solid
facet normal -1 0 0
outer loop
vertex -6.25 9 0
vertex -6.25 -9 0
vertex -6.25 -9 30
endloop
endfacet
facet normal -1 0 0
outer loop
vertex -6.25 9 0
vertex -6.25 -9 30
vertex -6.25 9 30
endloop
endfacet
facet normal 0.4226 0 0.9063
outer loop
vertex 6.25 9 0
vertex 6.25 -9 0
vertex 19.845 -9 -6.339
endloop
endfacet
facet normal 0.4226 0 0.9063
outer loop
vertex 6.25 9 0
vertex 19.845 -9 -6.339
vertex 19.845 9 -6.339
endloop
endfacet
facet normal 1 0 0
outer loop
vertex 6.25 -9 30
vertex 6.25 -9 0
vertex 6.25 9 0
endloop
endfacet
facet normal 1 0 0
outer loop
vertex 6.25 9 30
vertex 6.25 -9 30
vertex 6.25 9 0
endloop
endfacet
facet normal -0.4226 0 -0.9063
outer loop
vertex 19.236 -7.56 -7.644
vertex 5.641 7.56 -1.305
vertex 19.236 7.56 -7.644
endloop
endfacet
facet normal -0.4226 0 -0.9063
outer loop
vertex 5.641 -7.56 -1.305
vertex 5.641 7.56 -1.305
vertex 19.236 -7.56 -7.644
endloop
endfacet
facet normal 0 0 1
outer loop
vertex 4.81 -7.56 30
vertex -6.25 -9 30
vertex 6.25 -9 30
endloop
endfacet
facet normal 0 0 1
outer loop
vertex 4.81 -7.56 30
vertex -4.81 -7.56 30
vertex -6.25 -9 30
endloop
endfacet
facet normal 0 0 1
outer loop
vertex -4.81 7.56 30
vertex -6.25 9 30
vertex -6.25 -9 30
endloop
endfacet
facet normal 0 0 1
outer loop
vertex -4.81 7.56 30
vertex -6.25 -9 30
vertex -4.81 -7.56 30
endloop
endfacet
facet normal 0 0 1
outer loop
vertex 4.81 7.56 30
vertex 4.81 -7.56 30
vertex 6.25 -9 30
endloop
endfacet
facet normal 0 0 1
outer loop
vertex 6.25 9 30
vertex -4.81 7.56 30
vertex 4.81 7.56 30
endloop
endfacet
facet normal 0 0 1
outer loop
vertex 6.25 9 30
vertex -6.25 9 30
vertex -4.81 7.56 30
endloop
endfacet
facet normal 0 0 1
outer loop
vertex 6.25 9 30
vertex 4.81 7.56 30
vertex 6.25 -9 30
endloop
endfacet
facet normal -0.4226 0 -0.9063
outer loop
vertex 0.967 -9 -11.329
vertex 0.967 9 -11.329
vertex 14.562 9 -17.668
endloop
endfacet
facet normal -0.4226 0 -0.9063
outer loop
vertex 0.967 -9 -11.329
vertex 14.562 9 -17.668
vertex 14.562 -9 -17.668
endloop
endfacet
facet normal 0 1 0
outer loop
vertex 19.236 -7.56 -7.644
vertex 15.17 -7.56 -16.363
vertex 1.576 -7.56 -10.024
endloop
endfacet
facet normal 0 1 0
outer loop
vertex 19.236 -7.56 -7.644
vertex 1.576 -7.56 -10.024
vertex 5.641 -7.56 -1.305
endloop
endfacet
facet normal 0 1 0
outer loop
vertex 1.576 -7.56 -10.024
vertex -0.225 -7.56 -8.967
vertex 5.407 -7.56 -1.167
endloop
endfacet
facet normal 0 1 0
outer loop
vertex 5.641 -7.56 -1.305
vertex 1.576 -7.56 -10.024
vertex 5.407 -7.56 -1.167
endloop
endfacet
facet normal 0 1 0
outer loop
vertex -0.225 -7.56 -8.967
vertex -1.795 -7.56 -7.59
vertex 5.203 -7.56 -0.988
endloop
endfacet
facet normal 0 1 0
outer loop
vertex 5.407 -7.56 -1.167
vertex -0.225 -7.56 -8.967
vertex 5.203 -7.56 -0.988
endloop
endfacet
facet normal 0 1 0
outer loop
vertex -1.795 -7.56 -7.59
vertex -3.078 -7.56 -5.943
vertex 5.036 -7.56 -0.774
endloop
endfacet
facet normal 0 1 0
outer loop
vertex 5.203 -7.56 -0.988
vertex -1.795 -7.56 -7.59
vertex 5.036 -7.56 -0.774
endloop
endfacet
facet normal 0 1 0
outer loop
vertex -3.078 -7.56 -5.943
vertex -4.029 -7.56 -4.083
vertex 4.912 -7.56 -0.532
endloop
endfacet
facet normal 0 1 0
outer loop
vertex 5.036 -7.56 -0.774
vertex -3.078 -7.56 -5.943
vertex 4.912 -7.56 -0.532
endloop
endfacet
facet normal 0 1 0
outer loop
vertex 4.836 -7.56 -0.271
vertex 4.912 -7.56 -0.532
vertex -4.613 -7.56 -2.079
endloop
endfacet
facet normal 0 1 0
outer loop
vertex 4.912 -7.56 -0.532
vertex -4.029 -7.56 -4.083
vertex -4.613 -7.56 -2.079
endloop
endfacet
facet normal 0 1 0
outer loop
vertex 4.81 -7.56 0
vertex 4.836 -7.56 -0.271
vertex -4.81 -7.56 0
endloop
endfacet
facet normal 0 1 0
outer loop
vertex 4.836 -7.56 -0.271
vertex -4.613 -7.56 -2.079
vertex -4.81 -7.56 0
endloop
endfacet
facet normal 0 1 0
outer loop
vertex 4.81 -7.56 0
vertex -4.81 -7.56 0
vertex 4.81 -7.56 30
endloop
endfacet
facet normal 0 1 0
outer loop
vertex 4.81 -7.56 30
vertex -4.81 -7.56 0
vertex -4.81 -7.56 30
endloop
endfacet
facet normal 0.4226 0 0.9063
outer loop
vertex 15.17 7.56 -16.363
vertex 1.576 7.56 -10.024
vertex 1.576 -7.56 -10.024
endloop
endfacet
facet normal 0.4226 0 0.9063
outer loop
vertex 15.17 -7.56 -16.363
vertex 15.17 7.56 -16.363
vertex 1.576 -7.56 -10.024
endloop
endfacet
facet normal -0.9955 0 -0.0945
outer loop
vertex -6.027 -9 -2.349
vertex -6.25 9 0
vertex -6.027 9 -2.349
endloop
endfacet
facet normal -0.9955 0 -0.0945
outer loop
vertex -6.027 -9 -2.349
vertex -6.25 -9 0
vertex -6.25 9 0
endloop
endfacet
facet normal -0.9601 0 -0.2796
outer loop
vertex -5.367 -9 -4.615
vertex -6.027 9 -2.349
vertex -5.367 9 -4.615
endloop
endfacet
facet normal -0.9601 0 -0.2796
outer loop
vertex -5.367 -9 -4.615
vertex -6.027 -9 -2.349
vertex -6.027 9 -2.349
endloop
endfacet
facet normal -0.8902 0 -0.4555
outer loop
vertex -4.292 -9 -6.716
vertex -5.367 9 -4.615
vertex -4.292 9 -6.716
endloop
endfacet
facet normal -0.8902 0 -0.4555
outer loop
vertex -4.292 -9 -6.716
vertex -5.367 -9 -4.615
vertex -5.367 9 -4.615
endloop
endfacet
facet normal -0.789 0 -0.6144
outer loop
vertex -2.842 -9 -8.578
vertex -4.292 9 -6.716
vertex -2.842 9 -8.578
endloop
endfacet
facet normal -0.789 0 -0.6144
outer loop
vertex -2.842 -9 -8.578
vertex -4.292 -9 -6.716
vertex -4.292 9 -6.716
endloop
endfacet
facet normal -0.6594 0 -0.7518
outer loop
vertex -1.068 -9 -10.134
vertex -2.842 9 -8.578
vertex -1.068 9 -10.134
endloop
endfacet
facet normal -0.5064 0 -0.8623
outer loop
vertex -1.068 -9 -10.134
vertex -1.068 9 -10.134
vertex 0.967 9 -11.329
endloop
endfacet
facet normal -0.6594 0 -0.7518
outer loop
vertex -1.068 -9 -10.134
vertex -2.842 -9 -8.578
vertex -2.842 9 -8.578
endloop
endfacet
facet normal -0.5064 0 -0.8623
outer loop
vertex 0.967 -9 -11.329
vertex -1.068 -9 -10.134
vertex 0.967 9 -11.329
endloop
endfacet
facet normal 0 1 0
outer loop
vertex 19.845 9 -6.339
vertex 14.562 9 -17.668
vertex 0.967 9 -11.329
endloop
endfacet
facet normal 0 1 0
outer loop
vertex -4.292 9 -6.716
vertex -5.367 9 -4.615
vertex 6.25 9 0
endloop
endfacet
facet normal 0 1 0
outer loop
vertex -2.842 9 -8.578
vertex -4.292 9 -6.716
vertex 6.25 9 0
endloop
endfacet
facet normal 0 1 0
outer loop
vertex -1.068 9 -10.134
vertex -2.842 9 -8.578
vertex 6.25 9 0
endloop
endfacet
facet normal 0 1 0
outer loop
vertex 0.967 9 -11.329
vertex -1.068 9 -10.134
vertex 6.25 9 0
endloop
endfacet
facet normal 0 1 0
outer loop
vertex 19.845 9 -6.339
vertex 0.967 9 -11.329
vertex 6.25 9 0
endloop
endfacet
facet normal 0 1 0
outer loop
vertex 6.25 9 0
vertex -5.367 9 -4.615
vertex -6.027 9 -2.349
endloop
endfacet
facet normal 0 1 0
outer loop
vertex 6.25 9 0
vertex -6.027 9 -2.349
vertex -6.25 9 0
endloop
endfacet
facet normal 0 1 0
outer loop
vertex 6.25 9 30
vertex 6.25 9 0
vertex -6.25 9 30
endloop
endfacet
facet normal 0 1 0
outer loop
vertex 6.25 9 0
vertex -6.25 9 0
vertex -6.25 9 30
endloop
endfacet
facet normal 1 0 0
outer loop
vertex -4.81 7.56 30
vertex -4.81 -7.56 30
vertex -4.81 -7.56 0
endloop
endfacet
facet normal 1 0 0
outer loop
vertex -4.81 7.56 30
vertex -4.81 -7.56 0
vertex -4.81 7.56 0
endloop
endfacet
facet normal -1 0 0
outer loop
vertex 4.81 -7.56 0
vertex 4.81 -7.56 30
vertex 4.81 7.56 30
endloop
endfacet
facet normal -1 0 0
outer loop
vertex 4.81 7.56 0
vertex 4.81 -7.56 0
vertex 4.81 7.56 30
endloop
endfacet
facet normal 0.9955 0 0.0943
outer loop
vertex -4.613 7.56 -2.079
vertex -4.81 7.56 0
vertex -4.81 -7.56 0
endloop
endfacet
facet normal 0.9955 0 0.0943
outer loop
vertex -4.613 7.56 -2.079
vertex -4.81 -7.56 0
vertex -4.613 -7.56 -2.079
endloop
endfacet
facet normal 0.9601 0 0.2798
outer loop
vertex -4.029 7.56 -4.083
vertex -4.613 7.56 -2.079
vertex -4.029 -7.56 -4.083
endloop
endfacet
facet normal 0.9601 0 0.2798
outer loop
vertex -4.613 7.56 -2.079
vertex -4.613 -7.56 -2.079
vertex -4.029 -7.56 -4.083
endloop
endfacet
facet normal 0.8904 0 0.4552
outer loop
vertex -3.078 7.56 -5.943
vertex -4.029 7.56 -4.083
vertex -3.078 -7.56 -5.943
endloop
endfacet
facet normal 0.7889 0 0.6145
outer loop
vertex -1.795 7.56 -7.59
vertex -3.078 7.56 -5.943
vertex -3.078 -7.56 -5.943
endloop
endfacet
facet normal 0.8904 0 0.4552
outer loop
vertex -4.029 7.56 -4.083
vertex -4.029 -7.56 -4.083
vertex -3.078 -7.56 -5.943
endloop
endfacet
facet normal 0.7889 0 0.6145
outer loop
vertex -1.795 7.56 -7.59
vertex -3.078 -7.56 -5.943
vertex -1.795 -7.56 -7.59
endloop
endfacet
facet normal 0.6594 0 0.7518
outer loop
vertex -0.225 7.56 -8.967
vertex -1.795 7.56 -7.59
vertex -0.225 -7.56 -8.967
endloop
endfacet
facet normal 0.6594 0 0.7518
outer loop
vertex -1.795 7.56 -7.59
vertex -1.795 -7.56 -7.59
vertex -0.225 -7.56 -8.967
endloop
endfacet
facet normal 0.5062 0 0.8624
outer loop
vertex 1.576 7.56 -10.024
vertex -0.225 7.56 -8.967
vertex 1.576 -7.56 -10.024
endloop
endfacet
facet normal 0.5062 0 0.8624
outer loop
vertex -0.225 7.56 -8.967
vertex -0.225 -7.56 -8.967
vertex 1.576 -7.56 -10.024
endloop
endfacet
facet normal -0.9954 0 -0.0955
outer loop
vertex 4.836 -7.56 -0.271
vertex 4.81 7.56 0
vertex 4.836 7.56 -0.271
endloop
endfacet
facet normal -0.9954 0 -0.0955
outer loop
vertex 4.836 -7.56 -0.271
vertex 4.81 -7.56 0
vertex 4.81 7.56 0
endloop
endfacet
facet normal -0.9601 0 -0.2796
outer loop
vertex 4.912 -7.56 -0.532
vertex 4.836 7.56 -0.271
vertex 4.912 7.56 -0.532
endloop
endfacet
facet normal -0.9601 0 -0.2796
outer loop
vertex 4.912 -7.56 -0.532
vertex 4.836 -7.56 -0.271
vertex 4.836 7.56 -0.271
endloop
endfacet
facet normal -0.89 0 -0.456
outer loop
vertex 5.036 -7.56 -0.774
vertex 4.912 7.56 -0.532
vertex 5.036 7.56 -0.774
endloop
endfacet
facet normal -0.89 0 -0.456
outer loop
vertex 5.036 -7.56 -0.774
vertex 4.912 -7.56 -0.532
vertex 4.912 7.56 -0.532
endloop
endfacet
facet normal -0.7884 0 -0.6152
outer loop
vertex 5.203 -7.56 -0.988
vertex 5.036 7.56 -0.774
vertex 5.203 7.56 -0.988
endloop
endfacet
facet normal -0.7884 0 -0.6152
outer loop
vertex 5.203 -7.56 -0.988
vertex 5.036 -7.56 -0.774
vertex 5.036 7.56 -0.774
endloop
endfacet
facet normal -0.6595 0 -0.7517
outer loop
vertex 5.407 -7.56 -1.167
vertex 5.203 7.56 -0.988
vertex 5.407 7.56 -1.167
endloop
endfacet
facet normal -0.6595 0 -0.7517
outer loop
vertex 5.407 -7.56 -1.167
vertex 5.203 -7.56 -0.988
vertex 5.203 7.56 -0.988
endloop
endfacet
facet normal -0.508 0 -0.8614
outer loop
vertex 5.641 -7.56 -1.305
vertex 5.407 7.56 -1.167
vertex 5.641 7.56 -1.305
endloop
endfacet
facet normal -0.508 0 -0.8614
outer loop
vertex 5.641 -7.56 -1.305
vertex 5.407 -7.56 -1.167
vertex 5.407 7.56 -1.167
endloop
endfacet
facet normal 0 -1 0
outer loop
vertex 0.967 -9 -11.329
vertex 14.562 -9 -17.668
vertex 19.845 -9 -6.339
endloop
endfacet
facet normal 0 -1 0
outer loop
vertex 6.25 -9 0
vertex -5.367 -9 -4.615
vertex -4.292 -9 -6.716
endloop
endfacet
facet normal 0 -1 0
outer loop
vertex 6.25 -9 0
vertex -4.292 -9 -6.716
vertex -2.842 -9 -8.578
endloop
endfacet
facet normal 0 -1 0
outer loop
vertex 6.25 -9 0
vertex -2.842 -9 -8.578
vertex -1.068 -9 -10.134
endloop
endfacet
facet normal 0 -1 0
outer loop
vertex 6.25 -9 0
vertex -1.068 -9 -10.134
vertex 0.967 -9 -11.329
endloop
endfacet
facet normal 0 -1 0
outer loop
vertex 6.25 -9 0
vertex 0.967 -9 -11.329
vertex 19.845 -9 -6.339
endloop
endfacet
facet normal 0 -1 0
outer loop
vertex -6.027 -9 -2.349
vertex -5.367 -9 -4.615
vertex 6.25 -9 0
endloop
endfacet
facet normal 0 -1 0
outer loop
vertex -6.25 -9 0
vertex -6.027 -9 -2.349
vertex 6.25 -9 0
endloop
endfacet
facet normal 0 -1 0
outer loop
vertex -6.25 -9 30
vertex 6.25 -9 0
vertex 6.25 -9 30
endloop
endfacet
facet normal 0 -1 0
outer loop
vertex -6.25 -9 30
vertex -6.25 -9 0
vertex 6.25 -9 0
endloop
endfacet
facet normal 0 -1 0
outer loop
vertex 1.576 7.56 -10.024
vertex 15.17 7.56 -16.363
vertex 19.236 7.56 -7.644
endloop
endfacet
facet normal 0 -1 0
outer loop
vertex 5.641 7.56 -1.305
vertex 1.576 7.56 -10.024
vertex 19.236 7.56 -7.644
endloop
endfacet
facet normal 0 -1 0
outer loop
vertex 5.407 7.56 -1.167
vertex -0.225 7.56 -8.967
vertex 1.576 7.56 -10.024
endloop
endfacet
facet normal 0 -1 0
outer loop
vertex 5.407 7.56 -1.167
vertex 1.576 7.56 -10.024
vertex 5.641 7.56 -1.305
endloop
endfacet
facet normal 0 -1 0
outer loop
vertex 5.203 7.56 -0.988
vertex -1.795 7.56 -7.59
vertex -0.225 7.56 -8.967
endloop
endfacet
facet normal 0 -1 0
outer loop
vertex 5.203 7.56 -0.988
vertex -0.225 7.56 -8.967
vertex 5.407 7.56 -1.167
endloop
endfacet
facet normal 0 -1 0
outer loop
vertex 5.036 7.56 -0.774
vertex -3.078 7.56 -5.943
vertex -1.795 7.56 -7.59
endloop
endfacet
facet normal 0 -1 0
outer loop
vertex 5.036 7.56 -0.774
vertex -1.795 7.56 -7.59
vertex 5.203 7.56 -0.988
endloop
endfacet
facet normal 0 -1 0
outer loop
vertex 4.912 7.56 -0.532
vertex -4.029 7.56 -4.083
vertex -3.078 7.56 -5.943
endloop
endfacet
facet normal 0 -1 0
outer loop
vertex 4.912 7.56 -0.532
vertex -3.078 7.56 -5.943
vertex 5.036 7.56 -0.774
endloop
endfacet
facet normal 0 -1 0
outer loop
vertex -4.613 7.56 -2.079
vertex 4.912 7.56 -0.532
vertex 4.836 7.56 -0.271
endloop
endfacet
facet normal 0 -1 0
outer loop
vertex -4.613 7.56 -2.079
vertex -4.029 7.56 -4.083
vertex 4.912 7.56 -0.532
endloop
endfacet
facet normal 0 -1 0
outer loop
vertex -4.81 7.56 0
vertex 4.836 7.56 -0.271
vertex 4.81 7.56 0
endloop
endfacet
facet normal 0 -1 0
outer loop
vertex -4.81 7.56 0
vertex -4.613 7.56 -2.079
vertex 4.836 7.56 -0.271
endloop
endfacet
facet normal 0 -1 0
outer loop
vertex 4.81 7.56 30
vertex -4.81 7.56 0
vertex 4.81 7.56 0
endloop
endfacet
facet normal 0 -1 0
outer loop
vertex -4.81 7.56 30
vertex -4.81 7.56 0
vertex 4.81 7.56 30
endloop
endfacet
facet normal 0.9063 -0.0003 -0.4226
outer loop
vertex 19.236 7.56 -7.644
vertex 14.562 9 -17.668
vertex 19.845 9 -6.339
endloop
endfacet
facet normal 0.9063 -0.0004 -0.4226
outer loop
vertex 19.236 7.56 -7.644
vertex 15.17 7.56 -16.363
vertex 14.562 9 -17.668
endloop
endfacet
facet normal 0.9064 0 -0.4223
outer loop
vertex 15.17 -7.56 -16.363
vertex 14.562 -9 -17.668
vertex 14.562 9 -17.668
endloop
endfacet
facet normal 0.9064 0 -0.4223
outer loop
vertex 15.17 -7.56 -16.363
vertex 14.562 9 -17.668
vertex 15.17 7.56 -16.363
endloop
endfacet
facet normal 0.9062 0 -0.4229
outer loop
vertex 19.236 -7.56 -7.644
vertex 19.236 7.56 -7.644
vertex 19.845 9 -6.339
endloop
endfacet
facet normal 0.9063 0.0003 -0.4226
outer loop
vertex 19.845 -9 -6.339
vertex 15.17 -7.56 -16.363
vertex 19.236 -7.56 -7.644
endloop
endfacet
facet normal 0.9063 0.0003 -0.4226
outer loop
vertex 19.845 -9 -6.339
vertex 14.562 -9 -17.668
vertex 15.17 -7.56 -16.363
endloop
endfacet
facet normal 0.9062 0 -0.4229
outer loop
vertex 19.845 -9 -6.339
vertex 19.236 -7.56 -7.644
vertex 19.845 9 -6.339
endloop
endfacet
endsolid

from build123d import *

# Parameters (mm, degrees)
F0_W        = 12.5
F0_H        = 18
F0_W_2      = 9.62
F0_H_2      = 15.12
F1_DEPTH    = 30
F1_FACE_W   = 12.5
F1_FACE_H   = 18
F1_FACE_W_2 = 9.62
F1_FACE_H_2 = 15.12
F2_ANGLE    = 65
F3_DEPTH    = 15


with BuildPart() as f1:
    # F0 (on Top) → F1 (new body)
    with BuildSketch(Plane.XY):
        Rectangle(F0_W, F0_H)
        Rectangle(F0_W_2, F0_H_2, mode=Mode.SUBTRACT)
    extrude(amount=F1_DEPTH)

    # F1_face (on face) → F2 (revolve)
    with BuildSketch(Plane(origin=(0, 0, 0), x_dir=(1, 0, 0), z_dir=(0, 0, -1))):
        Rectangle(F1_FACE_W, F1_FACE_H)
        Rectangle(F1_FACE_W_2, F1_FACE_H_2, mode=Mode.SUBTRACT)
    revolve(axis=Axis((6.25, 0, 0), (0, -1, 0)), revolution_arc=F2_ANGLE)

    # F3 (add): a face of the model
    f3_faces = [f1.faces().sort_by_distance(p)[0] for p in [
        (3.6086358641, -8.78085393, -5.664423669),
    ]]
    extrude(f3_faces, amount=F3_DEPTH)


solid = f1.part
